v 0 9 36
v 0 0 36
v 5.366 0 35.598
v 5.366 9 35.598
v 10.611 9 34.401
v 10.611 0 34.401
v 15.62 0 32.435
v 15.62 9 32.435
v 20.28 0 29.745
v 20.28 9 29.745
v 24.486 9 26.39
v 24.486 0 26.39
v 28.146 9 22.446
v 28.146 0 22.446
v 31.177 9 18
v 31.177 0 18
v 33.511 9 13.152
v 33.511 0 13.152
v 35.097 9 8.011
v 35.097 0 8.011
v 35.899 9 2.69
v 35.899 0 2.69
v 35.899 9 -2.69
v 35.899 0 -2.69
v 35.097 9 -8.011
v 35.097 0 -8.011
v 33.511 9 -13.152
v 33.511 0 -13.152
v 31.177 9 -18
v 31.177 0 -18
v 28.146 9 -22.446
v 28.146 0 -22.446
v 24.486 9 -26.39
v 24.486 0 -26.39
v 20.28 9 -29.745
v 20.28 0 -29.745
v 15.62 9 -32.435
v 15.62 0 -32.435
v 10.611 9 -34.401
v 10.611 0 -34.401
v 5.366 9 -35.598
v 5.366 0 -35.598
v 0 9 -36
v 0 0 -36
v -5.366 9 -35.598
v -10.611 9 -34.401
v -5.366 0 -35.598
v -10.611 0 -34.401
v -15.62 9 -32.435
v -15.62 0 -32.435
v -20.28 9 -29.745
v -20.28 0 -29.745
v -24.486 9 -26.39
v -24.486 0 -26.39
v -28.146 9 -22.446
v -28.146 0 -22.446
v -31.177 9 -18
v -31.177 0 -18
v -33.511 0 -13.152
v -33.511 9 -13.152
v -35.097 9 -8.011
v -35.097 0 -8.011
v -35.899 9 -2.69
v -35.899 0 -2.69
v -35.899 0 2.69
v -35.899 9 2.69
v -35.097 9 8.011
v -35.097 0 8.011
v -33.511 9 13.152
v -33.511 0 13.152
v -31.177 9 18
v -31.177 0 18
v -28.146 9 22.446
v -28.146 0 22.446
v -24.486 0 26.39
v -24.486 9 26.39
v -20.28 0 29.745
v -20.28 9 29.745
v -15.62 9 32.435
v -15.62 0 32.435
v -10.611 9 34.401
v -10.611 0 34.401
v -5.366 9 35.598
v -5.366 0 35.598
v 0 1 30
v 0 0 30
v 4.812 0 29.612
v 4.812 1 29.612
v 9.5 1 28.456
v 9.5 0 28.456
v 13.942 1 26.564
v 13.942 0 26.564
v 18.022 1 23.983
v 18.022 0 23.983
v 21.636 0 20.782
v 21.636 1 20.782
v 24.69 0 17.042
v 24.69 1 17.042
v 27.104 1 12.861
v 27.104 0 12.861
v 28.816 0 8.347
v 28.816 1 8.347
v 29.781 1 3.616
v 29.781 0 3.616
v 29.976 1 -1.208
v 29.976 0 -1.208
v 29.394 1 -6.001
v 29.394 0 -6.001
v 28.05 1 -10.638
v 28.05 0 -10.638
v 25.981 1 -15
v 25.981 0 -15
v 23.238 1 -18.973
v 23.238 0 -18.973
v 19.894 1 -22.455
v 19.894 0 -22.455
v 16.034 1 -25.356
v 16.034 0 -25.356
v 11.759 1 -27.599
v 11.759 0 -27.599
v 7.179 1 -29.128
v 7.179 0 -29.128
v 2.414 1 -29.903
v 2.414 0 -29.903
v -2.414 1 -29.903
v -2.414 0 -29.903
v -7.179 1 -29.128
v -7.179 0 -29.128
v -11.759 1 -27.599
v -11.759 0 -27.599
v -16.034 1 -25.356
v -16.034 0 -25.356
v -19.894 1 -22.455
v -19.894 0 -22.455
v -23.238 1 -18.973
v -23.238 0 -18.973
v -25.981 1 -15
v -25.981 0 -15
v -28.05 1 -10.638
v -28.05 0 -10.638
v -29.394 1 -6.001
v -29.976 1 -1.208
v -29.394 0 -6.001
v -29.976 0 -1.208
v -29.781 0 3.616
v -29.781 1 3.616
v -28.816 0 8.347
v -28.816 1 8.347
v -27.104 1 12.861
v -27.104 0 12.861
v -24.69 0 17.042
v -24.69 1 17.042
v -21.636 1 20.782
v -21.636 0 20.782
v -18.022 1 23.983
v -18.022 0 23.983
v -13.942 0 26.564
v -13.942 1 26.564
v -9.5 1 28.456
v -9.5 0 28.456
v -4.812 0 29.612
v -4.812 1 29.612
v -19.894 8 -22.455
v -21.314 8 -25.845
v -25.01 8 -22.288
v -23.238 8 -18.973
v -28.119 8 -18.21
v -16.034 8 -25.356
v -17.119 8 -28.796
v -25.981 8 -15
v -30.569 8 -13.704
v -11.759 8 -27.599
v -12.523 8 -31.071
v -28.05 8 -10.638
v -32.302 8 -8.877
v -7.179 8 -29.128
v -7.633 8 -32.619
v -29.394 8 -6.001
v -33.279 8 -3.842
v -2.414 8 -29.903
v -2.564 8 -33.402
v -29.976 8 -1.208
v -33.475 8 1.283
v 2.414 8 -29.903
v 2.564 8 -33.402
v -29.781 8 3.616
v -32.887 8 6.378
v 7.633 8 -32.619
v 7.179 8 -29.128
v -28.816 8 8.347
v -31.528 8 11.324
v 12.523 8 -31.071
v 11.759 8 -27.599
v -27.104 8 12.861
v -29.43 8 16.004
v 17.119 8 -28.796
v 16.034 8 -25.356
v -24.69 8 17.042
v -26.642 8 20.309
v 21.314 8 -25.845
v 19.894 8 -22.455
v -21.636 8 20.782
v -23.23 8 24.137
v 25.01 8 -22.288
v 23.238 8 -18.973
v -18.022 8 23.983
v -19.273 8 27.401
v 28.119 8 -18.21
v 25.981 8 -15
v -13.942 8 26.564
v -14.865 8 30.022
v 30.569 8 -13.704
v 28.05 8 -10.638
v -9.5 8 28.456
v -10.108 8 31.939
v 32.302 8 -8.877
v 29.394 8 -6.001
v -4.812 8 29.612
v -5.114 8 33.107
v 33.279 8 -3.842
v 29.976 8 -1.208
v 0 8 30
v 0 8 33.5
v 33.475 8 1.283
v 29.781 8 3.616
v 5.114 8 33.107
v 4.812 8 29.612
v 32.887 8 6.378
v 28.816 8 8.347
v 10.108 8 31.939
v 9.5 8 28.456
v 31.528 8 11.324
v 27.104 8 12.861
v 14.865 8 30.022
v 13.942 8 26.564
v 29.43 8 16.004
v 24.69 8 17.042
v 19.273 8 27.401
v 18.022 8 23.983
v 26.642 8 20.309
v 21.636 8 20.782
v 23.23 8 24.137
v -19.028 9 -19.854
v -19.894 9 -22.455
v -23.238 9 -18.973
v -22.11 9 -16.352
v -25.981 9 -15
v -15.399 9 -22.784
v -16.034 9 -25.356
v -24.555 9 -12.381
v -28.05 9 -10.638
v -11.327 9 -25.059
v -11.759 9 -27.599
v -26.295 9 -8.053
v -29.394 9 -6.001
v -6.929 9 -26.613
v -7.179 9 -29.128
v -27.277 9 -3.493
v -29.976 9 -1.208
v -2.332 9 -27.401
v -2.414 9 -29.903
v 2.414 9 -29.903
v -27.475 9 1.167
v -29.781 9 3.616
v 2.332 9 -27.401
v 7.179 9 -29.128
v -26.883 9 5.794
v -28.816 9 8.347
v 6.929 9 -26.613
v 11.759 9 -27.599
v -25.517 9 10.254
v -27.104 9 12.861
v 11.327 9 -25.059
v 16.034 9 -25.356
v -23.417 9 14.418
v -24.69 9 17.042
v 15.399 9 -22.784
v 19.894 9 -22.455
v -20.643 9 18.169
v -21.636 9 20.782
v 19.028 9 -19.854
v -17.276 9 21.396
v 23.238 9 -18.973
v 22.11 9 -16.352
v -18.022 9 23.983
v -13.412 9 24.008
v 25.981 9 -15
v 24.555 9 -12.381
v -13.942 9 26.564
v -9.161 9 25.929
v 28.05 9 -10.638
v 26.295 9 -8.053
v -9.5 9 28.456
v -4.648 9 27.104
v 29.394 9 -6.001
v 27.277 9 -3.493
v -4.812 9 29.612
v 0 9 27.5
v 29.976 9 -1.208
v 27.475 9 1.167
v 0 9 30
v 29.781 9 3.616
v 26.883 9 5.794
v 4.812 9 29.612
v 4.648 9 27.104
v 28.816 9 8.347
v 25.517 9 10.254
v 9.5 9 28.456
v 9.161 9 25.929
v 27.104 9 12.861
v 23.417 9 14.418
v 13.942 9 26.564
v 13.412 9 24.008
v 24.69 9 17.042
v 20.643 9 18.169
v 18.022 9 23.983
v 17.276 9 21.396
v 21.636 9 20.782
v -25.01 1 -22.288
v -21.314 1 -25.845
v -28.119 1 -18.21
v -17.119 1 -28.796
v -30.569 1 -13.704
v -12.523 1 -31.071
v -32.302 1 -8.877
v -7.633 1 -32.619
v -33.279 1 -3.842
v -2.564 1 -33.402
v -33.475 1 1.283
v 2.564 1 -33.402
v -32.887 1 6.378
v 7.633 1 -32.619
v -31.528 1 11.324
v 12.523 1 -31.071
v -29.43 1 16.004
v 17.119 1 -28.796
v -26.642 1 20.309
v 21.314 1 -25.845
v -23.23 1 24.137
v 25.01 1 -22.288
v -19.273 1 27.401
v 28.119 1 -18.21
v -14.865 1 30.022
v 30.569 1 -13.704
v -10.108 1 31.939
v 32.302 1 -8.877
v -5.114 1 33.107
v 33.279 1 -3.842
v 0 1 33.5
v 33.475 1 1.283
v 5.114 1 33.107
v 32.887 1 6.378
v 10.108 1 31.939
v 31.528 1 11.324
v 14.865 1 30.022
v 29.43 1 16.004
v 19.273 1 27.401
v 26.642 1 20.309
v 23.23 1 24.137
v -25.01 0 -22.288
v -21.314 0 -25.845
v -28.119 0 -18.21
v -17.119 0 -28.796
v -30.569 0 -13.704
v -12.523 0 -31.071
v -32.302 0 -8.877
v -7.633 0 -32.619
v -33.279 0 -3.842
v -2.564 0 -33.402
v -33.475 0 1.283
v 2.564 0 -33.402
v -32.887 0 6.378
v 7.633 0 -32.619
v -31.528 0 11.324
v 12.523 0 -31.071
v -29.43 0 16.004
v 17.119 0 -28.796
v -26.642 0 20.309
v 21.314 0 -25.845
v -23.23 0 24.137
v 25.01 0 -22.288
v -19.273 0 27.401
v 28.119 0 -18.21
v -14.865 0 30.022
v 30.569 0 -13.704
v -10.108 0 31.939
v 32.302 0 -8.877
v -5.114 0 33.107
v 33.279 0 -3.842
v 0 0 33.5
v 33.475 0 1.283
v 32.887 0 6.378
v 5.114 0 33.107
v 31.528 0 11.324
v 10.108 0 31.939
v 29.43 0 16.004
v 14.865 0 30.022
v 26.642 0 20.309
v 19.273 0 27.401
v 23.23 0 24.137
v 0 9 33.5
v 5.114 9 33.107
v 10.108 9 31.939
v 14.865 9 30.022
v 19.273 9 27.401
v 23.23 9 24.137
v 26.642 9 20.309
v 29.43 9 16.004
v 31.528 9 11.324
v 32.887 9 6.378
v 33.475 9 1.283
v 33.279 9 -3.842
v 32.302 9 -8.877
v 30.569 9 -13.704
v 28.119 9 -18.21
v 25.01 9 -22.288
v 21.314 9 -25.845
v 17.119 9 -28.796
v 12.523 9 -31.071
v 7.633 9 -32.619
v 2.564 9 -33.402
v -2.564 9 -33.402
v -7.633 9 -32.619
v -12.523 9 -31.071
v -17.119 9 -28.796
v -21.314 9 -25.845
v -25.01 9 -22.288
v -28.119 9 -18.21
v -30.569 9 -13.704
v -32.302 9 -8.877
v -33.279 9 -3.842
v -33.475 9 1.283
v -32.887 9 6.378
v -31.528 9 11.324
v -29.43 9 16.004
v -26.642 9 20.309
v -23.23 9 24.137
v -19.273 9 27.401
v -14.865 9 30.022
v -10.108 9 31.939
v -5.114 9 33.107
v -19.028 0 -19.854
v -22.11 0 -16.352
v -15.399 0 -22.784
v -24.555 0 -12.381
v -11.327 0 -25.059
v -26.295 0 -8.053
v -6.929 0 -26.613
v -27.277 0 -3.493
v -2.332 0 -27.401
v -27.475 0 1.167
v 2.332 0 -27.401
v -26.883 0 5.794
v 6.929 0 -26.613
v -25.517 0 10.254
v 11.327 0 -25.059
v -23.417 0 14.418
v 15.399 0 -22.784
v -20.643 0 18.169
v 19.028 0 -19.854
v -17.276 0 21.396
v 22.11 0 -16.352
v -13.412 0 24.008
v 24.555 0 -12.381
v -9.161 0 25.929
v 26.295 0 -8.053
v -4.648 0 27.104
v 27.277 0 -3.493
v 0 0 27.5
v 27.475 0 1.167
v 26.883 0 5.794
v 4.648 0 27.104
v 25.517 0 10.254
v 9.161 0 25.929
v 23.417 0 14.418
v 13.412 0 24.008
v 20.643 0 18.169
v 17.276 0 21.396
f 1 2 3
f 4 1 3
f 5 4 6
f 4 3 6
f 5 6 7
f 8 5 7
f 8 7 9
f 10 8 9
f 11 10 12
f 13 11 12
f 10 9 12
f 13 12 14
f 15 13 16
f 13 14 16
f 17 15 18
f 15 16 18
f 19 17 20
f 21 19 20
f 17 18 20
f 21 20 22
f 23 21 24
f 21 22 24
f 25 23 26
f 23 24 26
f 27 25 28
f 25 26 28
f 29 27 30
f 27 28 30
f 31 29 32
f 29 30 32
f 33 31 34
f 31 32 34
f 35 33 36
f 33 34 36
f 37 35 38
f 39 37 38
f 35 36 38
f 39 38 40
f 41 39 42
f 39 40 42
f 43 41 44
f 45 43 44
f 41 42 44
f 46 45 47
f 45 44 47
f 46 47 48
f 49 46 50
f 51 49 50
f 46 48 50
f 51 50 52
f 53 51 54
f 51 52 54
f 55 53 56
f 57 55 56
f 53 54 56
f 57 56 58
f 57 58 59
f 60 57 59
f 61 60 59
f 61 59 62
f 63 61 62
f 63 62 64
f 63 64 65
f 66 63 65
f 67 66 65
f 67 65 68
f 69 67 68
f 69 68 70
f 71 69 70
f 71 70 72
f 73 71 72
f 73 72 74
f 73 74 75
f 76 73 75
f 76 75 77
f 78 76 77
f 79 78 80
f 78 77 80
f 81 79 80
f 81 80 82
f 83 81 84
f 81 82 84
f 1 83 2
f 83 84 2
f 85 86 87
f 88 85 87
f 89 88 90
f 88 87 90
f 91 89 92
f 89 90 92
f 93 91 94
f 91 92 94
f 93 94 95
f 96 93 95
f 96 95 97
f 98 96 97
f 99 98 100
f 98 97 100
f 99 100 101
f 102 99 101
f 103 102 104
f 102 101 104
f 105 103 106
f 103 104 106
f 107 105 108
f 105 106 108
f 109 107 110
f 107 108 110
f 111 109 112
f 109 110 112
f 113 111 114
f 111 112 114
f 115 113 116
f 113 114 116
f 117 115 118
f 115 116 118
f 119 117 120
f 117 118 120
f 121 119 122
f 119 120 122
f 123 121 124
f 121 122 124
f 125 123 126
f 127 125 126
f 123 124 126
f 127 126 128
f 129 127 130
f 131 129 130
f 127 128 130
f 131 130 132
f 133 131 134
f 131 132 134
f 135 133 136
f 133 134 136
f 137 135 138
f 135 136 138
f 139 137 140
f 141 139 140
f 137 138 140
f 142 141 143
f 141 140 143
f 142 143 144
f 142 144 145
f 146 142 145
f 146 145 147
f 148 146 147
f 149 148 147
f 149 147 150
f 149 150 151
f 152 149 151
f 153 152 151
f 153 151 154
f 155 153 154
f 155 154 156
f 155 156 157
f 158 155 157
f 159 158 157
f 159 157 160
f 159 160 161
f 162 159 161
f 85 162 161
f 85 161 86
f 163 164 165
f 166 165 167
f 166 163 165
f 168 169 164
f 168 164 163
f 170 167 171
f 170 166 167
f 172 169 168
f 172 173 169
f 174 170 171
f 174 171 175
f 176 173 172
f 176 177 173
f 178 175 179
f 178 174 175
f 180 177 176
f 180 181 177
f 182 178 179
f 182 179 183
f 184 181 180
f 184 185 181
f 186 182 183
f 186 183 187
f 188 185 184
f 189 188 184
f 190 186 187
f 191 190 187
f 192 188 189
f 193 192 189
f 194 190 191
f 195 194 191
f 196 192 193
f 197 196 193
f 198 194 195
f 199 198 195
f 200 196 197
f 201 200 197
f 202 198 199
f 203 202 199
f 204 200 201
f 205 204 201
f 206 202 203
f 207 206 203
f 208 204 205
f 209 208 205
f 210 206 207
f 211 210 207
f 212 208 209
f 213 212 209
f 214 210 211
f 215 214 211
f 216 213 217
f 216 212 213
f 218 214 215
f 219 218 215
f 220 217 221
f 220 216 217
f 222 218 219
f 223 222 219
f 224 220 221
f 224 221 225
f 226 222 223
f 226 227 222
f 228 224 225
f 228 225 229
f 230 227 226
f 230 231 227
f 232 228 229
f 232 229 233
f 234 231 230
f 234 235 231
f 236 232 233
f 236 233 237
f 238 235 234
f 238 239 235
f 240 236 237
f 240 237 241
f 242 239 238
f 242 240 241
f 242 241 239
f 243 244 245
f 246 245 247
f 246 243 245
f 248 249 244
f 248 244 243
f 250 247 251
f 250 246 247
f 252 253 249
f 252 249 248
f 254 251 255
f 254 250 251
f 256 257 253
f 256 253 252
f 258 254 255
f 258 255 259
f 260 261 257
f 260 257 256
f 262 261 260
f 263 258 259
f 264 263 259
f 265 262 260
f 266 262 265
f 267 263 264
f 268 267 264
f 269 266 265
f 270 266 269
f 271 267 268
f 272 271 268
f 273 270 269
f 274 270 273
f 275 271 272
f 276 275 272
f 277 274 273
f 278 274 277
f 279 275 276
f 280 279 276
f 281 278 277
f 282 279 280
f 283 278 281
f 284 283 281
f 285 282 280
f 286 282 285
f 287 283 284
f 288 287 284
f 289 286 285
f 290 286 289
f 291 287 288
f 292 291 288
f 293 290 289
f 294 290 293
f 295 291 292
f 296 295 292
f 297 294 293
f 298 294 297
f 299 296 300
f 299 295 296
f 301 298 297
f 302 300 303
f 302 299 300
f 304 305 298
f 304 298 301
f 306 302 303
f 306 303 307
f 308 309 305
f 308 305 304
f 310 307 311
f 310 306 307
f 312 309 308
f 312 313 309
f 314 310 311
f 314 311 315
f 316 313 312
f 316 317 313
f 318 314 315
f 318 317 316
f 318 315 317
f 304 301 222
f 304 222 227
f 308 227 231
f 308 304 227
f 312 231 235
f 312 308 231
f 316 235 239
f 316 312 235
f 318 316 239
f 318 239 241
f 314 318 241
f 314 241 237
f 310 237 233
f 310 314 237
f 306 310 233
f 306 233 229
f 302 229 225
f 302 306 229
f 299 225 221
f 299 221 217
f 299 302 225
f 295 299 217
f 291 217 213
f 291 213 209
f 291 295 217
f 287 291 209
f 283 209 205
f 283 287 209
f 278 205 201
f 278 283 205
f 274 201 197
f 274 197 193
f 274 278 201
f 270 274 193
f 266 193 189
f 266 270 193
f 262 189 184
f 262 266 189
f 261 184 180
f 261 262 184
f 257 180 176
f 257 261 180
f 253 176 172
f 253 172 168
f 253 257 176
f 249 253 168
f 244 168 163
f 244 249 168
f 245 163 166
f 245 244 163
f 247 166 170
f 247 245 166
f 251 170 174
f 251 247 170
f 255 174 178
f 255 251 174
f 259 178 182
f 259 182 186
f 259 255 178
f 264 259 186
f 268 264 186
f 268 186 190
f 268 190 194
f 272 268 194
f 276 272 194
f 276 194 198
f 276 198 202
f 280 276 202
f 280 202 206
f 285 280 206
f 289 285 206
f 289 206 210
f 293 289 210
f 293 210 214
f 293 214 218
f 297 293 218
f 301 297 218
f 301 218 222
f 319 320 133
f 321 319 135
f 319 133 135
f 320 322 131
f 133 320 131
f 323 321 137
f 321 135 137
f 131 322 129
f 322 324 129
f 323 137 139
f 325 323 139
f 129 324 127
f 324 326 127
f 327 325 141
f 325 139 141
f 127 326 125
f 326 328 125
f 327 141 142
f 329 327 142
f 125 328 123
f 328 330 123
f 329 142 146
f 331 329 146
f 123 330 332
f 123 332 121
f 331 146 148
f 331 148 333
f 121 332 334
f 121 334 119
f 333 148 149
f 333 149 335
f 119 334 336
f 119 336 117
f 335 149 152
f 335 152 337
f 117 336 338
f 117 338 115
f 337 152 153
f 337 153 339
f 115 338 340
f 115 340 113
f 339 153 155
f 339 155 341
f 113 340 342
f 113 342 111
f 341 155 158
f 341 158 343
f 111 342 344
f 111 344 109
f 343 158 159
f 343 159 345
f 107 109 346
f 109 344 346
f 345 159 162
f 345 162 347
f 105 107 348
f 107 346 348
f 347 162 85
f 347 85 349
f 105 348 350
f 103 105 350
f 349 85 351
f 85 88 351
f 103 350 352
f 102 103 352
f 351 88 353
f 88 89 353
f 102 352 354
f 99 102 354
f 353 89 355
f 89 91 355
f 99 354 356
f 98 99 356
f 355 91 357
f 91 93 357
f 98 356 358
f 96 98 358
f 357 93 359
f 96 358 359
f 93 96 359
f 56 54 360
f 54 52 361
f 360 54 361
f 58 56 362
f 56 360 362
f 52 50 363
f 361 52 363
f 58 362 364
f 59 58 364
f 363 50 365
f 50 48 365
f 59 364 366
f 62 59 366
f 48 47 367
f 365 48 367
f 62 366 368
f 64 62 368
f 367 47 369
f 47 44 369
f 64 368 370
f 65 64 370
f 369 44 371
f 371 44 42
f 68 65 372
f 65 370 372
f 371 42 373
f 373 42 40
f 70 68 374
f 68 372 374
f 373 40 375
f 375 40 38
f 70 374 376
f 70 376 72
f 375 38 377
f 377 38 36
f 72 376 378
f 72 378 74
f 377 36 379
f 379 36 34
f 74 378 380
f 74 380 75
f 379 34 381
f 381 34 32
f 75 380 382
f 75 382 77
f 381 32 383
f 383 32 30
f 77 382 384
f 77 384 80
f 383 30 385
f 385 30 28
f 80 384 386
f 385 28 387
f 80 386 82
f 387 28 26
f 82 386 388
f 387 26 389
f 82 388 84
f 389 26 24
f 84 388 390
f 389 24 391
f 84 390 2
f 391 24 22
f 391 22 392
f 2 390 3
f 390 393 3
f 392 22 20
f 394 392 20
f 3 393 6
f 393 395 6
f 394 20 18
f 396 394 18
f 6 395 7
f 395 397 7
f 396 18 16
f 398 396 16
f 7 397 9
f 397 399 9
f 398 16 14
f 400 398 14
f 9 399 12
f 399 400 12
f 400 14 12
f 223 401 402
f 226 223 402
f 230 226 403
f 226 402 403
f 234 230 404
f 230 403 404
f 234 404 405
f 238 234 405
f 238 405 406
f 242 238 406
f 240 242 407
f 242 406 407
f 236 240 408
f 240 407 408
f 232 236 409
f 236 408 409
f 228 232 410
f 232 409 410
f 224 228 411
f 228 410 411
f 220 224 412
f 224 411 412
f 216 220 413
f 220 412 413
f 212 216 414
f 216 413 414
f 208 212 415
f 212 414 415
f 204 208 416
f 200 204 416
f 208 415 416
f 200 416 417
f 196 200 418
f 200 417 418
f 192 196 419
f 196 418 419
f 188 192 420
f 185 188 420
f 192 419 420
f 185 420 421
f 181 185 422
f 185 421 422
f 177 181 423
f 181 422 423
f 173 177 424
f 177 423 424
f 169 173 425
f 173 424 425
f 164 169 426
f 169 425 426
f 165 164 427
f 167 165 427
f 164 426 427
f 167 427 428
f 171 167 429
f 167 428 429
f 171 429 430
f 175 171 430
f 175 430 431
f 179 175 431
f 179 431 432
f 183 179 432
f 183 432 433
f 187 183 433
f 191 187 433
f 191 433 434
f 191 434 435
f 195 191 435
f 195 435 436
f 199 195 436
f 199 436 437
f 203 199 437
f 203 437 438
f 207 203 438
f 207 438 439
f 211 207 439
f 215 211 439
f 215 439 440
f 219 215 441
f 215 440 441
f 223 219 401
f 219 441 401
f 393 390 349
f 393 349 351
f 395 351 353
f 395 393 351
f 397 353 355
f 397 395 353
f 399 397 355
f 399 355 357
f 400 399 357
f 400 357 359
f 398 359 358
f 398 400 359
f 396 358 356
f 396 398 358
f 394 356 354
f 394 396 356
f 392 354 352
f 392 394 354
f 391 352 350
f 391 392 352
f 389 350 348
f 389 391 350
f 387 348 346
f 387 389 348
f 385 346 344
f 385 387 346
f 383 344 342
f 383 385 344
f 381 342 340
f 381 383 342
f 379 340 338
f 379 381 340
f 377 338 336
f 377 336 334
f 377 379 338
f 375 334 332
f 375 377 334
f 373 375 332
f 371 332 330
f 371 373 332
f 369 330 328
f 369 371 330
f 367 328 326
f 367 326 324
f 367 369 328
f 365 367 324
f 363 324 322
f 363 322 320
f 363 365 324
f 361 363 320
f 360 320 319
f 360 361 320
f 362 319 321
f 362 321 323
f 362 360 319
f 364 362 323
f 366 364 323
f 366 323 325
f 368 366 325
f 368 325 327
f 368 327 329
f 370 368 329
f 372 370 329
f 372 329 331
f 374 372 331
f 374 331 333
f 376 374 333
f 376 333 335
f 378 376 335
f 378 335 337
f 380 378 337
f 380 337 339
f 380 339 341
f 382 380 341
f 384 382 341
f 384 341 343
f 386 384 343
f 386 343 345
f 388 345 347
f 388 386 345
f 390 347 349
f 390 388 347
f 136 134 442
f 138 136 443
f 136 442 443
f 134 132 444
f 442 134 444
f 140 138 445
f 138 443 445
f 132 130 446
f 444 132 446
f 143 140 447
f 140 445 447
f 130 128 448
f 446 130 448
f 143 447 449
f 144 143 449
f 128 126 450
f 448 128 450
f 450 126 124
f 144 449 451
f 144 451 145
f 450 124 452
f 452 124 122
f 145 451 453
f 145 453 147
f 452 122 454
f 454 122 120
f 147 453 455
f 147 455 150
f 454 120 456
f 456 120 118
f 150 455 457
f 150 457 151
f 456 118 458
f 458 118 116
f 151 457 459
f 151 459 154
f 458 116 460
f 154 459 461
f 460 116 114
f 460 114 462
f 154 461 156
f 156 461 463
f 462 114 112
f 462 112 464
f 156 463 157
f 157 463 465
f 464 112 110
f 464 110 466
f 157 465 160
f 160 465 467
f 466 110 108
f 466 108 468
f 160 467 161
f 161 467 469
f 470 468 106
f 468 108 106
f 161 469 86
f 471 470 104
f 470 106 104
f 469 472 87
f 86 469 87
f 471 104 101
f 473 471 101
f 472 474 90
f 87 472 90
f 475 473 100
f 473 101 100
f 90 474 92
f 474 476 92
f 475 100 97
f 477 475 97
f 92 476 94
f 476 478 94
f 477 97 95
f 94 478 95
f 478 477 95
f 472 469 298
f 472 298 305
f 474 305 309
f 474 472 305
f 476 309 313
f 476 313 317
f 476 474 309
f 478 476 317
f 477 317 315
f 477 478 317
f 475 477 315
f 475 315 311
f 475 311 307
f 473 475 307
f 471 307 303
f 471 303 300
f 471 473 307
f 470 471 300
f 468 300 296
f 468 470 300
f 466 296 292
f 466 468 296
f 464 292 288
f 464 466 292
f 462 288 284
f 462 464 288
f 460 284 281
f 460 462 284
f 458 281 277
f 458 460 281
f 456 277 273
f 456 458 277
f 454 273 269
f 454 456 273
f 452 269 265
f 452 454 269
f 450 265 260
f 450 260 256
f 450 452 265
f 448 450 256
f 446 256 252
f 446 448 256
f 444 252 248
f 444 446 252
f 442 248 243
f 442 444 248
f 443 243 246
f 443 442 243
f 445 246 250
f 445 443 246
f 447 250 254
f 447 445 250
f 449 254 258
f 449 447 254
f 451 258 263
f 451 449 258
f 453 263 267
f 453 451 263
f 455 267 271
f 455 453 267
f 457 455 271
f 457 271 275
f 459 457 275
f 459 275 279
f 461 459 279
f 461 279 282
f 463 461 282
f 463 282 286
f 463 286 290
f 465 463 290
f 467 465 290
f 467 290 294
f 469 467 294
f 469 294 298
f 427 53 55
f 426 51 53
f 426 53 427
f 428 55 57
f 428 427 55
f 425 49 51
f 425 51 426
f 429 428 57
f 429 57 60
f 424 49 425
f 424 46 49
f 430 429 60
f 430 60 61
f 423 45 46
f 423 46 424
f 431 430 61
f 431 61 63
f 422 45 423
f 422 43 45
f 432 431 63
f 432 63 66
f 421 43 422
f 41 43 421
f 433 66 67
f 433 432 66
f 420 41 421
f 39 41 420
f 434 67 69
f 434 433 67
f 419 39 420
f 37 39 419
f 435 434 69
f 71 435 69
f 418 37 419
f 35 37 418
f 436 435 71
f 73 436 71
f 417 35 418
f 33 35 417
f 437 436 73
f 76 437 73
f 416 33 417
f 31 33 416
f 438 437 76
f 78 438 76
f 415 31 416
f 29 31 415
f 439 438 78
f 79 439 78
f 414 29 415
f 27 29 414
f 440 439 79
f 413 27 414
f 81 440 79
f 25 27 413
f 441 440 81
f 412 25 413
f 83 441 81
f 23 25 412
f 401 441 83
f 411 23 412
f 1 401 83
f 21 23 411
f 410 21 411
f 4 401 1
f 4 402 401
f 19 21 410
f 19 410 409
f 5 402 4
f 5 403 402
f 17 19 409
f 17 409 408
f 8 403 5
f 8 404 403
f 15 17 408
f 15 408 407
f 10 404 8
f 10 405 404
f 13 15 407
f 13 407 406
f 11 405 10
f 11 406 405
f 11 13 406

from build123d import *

# Parameters (mm, degrees)
SKETCH1_R           = 36
SKETCH1_R_2         = 27.5
BOSS_EXTRUDE1_DEPTH = 9
SKETCH2_R           = 33.5
SKETCH2_R_2         = 30
CUT_EXTRUDE1_DEPTH  = 1


with BuildPart() as part:
    # Sketch1 → Boss-Extrude1 (new body)
    with BuildSketch(Plane(origin=(0, 0, 0), x_dir=(1, 0, 0), z_dir=(0, 1, 0))):
        with Locations(Location((0, 0, 0), (0, 0, 270))):
            Circle(SKETCH1_R)
        with Locations(Location((0, 0, 0), (0, 0, 270))):
            Circle(SKETCH1_R_2, mode=Mode.SUBTRACT)
    extrude(amount=BOSS_EXTRUDE1_DEPTH)

    # Sketch2 → Cut-Extrude1 (cut)
    with BuildSketch(Plane(origin=(0, 9, 0), x_dir=(1, 0, 0), z_dir=(0, 1, 0))):
        with Locations(Location((0, 0, 0), (0, 0, 270))):
            Circle(SKETCH2_R)
        with Locations(Location((0, 0, 0), (0, 0, 270))):
            Circle(SKETCH2_R_2, mode=Mode.SUBTRACT)
    cut_extrude1 = extrude(amount=-CUT_EXTRUDE1_DEPTH, mode=Mode.SUBTRACT)

    # Mirror1: Cut-Extrude1 across plane
    add(cut_extrude1.mirror(Plane.ZX.offset(4.5)), mode=Mode.SUBTRACT)


solid = part.part
